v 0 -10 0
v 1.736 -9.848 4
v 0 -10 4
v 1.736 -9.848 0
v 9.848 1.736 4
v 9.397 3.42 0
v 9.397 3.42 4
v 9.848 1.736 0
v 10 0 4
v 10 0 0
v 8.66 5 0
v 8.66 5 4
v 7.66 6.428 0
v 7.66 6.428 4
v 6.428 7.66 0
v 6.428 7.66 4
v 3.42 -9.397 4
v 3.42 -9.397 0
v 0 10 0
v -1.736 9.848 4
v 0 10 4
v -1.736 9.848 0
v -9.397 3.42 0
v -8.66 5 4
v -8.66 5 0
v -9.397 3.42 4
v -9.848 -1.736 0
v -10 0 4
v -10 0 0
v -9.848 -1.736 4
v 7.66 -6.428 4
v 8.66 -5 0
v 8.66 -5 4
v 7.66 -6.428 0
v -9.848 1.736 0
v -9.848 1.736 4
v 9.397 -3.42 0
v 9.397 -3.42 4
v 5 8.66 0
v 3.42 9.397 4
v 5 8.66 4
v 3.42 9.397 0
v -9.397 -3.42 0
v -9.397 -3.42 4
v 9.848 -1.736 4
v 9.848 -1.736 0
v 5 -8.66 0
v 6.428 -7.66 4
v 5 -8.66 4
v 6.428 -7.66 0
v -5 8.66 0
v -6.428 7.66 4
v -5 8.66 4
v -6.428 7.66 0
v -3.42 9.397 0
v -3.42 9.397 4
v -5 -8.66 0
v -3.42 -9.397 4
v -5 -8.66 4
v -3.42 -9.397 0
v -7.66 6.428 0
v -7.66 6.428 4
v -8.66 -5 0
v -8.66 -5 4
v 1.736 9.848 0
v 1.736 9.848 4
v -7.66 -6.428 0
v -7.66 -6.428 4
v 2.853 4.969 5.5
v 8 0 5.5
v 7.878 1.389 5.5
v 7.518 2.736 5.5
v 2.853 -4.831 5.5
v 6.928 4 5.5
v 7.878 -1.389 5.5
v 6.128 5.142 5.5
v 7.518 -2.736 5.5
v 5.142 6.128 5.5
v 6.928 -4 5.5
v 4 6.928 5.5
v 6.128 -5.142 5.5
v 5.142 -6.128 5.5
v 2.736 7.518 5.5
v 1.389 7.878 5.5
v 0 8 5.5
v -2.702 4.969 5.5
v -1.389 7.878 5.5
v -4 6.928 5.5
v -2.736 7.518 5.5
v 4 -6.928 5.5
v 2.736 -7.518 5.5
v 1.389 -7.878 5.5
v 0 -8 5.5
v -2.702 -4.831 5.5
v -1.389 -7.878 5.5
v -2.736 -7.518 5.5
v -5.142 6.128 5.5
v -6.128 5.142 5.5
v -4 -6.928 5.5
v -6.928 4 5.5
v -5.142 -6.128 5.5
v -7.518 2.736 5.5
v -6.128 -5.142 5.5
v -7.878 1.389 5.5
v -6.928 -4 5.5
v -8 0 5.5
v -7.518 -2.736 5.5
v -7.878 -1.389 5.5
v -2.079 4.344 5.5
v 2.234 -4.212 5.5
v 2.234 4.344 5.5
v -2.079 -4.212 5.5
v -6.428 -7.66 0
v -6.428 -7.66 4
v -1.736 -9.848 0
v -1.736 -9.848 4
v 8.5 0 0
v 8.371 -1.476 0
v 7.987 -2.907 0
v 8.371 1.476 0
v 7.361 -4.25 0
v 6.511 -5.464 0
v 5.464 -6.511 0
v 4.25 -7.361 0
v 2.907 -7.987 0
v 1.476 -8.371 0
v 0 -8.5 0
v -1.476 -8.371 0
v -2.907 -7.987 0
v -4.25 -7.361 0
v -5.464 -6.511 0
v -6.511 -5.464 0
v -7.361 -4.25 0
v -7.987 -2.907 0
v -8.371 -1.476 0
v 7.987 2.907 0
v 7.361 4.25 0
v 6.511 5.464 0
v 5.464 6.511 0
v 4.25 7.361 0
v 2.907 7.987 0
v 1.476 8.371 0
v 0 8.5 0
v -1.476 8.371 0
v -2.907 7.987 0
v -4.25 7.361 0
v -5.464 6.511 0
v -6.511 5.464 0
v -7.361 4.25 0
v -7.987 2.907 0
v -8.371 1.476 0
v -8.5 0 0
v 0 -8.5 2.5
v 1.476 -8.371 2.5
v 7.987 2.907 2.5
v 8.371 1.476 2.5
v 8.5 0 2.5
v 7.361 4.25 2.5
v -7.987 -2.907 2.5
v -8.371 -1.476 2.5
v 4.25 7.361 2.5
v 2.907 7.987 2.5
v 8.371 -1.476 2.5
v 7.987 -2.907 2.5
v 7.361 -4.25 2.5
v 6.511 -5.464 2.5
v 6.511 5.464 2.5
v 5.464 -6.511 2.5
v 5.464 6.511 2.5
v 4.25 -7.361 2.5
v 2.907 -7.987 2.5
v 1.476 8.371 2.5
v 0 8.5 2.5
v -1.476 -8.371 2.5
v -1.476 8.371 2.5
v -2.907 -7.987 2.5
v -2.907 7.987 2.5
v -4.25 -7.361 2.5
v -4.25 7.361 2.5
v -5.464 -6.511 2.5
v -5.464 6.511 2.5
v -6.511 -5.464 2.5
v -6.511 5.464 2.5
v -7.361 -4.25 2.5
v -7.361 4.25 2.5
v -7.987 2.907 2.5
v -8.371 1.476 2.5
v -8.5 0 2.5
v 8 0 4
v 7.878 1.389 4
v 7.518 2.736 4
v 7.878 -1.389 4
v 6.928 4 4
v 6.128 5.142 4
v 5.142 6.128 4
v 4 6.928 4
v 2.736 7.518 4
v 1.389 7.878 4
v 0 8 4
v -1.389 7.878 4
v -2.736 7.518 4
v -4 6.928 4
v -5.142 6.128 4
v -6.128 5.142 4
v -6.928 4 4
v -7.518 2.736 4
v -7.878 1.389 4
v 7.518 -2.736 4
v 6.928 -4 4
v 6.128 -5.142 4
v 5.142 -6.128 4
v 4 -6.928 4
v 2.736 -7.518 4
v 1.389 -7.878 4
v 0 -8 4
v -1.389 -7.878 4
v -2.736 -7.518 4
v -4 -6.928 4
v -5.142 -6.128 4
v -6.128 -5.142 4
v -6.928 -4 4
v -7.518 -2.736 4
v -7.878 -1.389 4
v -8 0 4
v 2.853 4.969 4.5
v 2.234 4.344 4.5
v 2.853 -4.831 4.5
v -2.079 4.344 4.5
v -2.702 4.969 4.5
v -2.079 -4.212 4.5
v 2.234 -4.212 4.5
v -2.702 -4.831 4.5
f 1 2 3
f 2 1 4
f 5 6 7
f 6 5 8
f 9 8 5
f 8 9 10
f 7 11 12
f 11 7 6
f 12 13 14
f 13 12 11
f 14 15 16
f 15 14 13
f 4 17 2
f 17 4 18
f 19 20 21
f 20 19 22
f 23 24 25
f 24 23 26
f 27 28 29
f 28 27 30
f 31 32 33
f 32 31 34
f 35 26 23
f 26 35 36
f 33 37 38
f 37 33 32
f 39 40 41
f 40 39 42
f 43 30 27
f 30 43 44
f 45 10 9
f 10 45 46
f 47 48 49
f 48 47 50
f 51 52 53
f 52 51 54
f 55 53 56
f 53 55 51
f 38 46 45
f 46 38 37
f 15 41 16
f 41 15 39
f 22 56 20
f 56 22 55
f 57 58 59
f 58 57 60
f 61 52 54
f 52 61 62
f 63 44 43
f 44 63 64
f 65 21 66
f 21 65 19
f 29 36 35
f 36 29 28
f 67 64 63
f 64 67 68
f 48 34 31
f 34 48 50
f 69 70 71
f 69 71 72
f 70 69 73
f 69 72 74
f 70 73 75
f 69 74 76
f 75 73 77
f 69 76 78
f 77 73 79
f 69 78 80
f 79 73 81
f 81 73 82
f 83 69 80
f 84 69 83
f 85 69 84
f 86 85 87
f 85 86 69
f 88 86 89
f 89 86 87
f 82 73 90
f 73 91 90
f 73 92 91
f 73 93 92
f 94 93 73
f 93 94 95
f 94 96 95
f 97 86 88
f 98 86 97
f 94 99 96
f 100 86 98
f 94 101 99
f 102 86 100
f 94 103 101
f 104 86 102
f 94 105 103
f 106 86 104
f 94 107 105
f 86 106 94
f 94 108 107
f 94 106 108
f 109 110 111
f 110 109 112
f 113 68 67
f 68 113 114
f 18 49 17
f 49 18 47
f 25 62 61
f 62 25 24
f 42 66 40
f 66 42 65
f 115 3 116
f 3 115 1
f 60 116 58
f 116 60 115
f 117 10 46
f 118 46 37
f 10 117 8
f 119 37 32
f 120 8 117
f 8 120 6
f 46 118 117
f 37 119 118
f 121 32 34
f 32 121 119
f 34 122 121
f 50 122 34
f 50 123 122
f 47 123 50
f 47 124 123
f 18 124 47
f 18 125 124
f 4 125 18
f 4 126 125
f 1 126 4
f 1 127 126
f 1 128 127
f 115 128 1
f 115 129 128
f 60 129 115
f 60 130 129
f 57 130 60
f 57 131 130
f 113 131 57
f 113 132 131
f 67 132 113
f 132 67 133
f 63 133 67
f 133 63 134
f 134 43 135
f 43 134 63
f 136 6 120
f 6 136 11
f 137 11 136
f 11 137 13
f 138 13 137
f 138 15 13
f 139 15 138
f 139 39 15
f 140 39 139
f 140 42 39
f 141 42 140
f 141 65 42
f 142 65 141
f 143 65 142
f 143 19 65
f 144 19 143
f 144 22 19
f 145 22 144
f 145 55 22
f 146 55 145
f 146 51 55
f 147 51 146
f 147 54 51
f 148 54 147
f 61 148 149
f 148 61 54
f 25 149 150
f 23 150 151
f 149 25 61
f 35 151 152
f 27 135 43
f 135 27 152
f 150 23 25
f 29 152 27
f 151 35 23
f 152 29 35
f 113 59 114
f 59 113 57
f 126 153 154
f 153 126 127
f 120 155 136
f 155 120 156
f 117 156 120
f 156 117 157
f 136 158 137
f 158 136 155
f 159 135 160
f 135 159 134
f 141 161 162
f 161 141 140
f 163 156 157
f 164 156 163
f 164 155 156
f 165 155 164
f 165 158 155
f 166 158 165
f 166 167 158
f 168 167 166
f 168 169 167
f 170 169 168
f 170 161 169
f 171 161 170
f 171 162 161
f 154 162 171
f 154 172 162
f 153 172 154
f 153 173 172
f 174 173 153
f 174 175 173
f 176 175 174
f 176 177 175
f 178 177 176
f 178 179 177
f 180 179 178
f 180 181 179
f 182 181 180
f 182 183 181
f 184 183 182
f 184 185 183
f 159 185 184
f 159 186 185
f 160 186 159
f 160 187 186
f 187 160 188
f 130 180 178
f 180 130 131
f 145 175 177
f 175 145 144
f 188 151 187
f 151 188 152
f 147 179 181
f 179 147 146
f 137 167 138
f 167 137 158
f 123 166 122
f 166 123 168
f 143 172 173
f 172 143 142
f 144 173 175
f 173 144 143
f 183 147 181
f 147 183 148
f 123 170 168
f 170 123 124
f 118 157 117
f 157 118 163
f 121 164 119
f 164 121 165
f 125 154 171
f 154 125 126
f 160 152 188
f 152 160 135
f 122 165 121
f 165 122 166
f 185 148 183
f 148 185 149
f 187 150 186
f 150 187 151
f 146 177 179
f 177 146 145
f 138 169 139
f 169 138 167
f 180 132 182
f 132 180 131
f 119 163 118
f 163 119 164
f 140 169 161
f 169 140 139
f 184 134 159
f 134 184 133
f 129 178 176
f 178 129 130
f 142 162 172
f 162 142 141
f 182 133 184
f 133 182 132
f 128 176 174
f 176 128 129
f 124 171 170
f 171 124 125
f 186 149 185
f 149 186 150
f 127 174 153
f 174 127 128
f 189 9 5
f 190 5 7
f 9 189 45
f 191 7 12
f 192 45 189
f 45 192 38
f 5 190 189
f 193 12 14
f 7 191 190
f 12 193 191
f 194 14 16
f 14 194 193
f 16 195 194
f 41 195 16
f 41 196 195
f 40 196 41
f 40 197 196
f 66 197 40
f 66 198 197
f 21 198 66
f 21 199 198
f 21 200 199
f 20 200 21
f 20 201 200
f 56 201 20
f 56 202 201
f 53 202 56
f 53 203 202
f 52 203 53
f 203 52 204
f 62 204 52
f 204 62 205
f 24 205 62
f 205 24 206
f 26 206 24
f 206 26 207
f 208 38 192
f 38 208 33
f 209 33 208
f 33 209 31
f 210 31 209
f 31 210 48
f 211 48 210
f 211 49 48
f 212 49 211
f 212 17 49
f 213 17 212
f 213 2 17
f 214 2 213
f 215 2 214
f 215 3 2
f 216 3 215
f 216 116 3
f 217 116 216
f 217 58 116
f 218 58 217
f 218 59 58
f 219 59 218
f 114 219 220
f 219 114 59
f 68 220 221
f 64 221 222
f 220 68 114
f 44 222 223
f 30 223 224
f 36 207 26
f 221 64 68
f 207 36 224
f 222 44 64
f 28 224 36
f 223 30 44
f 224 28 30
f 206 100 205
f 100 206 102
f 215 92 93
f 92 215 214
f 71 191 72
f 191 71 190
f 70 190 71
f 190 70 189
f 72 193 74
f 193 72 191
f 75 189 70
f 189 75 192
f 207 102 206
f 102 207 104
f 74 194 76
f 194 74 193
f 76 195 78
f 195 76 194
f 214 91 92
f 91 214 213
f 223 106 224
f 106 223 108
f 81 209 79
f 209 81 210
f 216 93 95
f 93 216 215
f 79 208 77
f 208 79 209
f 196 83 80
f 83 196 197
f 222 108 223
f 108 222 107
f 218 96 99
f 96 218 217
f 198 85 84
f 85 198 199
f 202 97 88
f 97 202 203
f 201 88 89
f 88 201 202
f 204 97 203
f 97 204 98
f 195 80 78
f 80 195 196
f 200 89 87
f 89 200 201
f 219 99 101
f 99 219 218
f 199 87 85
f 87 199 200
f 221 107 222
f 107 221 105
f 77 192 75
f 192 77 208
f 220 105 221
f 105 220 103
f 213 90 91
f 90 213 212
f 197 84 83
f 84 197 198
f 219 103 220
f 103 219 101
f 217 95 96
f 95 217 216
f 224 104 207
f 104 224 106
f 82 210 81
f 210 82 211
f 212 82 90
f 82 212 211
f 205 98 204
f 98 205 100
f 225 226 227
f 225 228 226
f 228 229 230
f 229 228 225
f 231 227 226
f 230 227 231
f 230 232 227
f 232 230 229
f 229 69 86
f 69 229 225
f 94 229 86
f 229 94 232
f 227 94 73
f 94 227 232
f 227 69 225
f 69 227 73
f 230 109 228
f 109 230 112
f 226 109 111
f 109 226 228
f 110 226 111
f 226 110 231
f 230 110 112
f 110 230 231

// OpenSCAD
difference() {
	difference() {
		difference() {
			cylinder($fn = 36, h = 5.5000000000, r = 10);
			translate(v = [0, 0, -1]) {
				cylinder($fn = 36, h = 3.5000000000, r = 8.5000000000);
			}
		}
		translate(v = [0, 0, 4]) {
			difference() {
				cylinder($fn = 36, h = 3, r = 10.5000000000);
				cylinder($fn = 36, h = 3, r = 8);
			}
		}
	}
	translate(v = [0, 0, 4.5000000000]) {
		linear_extrude(height = 3) {
			text(font = "mana", halign = "center", size = 8, text = "\uE603", valign = "center");
		}
	}
}
